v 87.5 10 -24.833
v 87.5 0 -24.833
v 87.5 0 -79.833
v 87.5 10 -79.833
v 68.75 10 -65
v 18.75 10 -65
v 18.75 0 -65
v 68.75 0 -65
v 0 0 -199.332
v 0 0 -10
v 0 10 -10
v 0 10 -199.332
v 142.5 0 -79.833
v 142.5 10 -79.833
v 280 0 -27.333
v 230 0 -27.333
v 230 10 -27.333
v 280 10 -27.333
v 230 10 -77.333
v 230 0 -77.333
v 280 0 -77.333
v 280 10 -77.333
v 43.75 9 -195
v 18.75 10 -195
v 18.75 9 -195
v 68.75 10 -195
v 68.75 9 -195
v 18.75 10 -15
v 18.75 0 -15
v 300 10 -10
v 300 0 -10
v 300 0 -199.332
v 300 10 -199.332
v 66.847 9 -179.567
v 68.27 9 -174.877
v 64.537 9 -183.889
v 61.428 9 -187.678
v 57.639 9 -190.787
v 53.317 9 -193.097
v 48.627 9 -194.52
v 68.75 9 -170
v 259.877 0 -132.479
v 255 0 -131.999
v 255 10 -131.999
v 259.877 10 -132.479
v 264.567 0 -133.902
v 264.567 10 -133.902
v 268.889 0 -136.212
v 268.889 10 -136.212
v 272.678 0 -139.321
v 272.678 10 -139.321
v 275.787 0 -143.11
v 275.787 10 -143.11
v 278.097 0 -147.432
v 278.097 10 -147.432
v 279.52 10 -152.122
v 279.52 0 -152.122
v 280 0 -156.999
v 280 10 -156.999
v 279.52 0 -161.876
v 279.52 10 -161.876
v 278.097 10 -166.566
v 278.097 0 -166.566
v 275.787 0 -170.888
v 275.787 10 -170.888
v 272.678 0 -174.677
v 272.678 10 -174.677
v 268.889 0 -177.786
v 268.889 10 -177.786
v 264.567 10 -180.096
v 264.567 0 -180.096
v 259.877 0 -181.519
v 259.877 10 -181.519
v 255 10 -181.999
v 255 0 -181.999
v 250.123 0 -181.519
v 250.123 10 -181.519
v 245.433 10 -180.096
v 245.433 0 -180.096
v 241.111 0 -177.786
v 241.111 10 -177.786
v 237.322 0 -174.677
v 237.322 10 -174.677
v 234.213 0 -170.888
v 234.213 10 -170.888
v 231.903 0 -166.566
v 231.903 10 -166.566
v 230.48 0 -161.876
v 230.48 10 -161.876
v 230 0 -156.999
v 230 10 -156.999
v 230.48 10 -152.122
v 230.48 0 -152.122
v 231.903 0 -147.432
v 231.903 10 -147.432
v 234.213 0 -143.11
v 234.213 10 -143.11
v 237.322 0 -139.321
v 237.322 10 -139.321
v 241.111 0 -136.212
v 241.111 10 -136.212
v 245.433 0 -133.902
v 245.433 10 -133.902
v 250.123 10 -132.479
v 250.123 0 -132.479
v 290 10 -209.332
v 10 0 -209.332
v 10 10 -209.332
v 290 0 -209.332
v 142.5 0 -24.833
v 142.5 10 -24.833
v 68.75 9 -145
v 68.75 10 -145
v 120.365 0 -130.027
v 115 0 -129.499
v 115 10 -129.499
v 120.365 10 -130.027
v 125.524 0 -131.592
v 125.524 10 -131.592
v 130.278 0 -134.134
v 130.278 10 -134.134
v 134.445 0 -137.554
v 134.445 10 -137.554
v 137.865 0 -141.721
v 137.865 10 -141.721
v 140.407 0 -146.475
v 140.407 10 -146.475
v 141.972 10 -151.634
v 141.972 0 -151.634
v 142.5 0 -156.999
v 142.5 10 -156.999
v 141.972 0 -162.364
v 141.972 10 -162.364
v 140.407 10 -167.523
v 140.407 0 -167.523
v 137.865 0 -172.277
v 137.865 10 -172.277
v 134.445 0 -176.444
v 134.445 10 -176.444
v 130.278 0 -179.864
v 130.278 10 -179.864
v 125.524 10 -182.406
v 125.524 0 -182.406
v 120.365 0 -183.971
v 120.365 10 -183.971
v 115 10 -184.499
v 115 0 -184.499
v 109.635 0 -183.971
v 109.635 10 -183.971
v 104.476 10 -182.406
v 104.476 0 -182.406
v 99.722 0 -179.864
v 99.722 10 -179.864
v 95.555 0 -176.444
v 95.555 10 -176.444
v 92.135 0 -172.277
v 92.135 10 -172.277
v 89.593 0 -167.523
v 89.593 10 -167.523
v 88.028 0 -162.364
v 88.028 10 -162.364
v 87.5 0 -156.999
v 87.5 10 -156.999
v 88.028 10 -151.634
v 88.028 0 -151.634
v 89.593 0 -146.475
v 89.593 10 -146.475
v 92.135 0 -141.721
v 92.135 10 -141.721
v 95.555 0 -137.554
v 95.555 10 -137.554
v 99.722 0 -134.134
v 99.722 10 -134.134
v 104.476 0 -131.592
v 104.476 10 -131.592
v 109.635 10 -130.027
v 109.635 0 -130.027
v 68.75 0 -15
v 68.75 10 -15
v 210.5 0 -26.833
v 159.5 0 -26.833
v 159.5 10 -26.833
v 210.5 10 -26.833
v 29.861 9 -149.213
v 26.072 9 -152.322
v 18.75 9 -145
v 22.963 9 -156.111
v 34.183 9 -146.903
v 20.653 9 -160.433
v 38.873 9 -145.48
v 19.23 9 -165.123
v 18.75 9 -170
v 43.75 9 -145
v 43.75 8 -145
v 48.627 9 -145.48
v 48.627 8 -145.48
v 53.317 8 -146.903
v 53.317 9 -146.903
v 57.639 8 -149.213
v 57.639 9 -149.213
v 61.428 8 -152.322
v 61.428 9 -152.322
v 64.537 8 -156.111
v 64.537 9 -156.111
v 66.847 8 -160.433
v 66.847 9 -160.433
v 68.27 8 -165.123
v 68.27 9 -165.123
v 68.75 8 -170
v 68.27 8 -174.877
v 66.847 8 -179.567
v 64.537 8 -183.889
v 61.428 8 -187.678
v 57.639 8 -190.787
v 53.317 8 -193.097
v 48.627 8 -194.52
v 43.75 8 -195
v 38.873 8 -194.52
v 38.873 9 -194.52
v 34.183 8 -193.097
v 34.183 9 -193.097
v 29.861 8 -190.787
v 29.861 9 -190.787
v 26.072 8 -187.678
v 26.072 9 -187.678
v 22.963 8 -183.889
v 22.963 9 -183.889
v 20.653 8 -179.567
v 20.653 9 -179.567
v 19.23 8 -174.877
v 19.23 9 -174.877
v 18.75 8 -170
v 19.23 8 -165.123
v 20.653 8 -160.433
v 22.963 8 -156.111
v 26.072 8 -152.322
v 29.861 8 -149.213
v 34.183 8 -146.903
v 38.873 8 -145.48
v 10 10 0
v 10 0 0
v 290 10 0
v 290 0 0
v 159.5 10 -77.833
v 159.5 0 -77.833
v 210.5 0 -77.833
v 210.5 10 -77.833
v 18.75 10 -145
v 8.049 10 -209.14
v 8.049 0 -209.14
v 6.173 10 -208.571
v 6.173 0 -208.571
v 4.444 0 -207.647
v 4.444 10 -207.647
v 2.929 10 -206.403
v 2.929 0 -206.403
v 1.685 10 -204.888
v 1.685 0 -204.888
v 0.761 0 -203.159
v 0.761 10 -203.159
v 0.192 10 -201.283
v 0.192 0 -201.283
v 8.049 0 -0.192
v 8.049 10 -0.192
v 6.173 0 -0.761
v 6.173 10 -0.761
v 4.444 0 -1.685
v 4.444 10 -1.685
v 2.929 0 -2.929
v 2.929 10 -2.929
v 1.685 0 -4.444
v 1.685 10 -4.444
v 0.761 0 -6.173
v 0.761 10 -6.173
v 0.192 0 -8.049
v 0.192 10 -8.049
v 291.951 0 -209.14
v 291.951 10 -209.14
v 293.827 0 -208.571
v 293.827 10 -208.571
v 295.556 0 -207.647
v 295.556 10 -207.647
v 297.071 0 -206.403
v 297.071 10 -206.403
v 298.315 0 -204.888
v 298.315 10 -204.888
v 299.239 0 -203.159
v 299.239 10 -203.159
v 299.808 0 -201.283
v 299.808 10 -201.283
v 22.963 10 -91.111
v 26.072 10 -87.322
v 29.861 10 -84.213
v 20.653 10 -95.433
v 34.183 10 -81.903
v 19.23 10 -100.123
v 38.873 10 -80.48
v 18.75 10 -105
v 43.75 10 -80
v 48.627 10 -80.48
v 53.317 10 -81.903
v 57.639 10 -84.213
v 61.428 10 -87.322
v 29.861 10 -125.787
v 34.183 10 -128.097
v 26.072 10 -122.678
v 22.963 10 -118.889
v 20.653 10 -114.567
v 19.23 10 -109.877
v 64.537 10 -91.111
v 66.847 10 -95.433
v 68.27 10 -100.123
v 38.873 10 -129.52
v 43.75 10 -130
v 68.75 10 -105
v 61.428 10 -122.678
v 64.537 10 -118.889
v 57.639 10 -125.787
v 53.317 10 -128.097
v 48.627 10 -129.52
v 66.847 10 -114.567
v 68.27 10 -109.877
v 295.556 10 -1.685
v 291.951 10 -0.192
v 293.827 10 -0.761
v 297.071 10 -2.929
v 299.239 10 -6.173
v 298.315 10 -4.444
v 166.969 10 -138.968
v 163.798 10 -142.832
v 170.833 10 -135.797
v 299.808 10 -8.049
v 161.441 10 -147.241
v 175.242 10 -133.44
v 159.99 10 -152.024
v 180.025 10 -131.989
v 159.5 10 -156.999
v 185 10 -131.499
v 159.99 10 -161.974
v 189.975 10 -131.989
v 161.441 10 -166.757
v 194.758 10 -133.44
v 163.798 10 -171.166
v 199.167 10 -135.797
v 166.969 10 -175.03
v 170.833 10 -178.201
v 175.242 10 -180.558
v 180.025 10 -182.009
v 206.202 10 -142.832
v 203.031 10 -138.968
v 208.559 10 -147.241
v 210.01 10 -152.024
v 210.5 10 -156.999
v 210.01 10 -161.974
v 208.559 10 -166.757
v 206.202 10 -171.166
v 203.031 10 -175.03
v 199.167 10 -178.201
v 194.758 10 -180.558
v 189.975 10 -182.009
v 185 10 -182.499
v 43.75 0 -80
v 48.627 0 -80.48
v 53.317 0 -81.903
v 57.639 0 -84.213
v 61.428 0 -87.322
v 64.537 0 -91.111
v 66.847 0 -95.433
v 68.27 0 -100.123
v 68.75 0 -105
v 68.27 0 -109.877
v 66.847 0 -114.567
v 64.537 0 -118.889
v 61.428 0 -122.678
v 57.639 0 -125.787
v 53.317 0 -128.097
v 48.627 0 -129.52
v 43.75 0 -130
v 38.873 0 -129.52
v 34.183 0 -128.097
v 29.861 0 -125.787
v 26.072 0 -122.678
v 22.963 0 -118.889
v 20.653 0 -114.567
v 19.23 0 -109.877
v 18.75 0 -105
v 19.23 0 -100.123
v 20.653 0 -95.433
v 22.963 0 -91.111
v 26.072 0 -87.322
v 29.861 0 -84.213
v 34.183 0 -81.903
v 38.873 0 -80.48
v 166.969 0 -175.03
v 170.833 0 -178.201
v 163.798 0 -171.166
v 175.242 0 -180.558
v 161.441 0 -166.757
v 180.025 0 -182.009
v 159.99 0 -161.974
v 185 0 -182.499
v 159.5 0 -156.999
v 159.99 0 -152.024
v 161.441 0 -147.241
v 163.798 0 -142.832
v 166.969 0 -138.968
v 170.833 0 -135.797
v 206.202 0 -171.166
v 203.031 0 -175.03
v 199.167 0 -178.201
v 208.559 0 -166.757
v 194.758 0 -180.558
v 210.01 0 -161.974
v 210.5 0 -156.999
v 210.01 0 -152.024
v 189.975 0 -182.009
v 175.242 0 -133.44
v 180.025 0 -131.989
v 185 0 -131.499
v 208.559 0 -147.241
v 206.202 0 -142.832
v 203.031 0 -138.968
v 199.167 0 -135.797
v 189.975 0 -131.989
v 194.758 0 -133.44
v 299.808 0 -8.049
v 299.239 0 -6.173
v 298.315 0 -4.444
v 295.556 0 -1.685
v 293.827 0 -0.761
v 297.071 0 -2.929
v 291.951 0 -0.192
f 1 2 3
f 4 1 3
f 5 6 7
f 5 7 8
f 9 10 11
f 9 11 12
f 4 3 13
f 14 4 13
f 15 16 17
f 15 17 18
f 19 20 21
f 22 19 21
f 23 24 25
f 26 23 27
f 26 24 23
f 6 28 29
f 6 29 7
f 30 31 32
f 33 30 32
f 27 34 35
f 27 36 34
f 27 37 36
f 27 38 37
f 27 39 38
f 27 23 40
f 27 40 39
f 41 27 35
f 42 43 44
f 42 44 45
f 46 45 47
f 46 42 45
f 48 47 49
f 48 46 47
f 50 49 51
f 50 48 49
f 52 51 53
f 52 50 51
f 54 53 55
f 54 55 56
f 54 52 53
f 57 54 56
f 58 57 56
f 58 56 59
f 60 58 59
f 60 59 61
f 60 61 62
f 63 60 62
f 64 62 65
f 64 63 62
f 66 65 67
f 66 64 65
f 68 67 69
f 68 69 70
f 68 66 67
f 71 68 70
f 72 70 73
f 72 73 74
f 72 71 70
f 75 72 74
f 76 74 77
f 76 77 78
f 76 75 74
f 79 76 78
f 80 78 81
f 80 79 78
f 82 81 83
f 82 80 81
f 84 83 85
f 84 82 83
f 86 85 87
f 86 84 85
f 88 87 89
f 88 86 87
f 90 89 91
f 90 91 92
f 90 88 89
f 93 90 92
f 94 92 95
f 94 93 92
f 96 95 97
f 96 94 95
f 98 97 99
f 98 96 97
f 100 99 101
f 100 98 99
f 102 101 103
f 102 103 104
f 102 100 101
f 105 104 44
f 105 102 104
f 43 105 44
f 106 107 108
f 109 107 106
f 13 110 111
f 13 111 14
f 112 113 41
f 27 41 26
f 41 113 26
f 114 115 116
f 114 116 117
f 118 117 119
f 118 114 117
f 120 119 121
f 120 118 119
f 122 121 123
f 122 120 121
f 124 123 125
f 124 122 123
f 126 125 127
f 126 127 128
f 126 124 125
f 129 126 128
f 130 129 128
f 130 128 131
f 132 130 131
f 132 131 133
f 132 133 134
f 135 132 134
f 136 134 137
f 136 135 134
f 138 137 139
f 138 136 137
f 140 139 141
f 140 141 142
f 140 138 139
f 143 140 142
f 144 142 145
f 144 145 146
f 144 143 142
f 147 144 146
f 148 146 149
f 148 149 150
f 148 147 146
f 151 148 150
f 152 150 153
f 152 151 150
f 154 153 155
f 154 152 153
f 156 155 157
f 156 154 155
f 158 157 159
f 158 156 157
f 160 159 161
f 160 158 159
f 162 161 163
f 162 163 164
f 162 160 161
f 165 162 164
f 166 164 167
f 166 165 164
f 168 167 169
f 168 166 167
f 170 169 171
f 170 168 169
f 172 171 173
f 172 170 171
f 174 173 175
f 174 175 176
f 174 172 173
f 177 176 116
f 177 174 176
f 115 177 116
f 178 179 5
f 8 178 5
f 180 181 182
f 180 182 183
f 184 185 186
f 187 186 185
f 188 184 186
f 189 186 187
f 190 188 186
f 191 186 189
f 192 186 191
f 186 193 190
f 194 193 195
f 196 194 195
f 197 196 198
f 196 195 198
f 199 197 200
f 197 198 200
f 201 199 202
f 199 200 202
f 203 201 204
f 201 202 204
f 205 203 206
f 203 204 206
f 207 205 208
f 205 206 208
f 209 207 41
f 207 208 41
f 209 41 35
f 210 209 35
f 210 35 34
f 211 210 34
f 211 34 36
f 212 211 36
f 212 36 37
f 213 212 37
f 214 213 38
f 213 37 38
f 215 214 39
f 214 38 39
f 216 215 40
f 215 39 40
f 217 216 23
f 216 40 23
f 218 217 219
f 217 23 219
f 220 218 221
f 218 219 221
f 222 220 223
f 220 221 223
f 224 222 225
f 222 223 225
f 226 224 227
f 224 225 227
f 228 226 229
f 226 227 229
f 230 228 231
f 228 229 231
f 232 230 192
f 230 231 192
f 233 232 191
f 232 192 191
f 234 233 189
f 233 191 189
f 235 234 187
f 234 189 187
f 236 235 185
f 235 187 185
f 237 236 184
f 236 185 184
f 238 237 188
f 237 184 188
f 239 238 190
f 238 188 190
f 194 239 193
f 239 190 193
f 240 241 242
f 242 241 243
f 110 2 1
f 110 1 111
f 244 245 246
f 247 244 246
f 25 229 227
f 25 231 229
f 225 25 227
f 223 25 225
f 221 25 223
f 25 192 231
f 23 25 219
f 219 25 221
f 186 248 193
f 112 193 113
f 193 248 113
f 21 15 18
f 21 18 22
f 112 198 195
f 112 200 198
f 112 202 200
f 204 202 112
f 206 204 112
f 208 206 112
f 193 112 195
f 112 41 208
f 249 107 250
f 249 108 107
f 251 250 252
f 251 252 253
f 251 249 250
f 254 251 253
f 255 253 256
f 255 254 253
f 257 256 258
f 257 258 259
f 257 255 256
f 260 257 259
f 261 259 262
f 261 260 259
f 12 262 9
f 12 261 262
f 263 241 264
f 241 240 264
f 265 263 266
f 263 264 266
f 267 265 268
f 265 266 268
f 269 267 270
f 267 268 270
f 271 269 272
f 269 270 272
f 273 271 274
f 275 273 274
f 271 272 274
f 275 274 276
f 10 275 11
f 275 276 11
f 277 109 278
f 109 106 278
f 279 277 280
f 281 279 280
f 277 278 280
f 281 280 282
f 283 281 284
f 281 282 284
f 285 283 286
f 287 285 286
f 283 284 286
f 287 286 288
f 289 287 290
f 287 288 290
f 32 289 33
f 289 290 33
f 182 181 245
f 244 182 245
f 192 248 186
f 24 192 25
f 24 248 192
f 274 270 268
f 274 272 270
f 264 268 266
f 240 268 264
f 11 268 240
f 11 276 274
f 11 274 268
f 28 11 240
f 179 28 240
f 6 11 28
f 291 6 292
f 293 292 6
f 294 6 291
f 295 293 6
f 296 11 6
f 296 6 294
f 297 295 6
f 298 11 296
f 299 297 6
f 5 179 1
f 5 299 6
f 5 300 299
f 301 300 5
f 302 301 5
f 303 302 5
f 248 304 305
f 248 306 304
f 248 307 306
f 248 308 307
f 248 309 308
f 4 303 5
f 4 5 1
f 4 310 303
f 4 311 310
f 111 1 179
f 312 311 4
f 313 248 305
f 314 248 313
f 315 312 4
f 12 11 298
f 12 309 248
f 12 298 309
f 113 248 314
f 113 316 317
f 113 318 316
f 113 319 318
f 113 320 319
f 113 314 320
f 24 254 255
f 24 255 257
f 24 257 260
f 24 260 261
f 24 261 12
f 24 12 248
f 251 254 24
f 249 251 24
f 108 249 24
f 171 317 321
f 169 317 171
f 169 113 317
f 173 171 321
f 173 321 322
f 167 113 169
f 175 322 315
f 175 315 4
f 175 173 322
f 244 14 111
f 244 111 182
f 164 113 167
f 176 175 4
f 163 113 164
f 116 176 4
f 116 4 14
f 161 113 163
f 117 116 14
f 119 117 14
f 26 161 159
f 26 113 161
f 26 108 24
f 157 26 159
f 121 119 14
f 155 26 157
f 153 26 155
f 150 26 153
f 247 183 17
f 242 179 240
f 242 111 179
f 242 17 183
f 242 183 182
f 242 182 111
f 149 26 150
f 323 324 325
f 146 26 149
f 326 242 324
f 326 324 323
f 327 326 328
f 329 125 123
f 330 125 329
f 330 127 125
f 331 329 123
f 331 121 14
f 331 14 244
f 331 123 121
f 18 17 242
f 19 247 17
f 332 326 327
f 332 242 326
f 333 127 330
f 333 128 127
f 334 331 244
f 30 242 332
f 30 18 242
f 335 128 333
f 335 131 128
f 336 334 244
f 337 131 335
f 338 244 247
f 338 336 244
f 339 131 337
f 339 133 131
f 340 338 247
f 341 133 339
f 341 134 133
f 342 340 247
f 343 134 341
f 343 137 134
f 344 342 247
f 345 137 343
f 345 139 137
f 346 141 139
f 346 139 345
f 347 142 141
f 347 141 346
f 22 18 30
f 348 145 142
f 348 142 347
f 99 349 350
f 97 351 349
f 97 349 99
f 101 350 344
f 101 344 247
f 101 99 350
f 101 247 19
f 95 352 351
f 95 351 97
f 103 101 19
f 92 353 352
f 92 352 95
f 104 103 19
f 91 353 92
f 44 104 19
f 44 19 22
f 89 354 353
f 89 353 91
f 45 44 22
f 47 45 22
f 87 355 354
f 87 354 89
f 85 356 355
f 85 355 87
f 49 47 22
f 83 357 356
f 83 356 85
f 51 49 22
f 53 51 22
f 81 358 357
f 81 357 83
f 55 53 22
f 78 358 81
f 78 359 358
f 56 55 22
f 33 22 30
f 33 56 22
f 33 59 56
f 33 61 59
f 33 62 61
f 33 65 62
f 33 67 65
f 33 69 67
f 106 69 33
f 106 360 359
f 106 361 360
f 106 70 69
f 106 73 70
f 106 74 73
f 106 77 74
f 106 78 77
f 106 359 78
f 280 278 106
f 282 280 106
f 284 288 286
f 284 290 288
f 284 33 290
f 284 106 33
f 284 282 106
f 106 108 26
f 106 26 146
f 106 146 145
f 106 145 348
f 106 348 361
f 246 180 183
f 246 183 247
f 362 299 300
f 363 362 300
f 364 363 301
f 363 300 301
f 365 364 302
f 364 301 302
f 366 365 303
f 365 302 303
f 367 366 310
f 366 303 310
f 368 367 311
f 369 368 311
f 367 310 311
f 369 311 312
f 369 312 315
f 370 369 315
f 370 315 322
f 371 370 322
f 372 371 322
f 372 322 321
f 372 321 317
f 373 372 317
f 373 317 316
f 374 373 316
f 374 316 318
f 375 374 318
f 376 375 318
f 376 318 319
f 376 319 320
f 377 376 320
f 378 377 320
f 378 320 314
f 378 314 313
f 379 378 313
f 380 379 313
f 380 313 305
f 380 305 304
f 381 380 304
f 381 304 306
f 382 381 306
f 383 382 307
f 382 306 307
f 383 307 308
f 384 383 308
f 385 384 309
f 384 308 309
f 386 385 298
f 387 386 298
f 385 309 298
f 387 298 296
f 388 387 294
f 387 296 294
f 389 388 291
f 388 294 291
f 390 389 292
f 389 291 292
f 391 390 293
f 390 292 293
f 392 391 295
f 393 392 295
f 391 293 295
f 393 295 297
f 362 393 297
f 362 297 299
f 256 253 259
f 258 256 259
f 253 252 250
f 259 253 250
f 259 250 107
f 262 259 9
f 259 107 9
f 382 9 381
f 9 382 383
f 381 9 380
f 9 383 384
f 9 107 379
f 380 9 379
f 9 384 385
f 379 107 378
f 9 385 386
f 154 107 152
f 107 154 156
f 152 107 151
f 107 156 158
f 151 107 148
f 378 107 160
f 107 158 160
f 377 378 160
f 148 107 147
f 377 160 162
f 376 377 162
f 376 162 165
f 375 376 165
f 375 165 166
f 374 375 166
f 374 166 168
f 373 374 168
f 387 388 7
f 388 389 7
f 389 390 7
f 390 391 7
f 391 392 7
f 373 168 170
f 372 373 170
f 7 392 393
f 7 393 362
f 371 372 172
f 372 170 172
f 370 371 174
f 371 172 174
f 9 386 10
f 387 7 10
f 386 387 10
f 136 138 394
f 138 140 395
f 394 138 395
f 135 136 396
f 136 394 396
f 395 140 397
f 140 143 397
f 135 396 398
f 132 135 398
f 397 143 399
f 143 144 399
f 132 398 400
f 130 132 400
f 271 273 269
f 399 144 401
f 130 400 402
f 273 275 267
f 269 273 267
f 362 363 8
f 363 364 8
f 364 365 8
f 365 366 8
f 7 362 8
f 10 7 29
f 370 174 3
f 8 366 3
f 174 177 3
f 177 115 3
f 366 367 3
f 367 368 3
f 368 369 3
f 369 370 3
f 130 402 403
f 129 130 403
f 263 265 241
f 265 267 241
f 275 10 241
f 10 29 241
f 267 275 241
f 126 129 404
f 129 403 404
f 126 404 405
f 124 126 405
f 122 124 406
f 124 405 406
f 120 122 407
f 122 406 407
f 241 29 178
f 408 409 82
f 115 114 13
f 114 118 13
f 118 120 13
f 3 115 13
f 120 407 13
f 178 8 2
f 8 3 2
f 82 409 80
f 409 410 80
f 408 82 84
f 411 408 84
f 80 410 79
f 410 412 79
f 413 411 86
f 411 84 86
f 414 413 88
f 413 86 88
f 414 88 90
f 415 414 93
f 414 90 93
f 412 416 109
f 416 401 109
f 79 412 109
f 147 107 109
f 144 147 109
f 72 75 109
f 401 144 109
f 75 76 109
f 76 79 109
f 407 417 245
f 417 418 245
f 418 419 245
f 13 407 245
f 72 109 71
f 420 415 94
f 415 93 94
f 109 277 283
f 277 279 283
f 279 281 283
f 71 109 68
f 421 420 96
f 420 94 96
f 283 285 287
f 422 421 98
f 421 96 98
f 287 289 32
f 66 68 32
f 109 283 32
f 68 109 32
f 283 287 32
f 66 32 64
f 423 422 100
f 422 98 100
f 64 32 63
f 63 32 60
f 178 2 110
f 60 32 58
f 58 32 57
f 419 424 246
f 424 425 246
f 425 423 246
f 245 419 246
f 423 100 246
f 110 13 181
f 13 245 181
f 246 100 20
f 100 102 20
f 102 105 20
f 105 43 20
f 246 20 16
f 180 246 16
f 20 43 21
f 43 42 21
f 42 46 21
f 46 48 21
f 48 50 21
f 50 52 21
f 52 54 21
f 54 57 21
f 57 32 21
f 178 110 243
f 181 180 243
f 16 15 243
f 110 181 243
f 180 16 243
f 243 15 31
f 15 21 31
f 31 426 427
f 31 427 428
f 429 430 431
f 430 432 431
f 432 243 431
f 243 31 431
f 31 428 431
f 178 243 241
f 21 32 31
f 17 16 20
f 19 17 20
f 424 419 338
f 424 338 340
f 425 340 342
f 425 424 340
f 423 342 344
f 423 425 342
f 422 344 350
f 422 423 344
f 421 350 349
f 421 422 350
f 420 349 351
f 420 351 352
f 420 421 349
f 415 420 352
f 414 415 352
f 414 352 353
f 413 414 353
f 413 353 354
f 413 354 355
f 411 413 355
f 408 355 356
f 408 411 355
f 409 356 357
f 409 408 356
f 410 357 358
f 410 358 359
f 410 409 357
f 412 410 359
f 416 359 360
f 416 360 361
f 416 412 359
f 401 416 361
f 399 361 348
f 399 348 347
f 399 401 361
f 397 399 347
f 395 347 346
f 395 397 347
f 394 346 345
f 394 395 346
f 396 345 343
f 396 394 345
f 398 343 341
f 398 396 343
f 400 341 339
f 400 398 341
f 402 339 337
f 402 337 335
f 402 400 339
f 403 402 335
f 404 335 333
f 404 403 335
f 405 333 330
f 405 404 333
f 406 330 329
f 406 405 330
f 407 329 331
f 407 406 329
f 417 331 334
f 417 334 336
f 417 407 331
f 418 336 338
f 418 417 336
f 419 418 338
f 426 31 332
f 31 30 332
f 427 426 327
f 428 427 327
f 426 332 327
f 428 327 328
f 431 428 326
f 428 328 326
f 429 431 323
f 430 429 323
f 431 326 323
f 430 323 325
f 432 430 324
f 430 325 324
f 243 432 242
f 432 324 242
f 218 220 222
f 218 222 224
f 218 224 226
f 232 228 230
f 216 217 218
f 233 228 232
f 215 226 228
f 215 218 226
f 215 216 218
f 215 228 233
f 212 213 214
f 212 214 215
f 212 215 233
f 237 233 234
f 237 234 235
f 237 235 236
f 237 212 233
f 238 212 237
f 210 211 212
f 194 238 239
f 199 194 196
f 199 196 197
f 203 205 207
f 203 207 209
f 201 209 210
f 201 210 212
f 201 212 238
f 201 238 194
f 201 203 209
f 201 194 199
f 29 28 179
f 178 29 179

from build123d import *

# Parameters (mm, degrees)
SKETCH1_W           = 300
SKETCH1_H           = 209.332
SKETCH1_R           = 25
SKETCH1_R_2         = 27.5
SKETCH1_R_3         = 25.5
SKETCH1_W_2         = 55
SKETCH1_H_2         = 55
SKETCH1_W_3         = 51
SKETCH1_H_3         = 51
SKETCH1_W_4         = 50
SKETCH1_H_4         = 50
BOSS_EXTRUDE1_DEPTH = 10
SKETCH2_W           = 50
SKETCH2_H           = 50
CUT_EXTRUDE1_DEPTH  = 1
BOSS_EXTRUDE2_START = -9
SKETCH3_R           = 25
BOSS_EXTRUDE2_DEPTH = 8
SKETCH4_W           = 50
SKETCH4_H           = 50
CUT_EXTRUDE2_DEPTH  = 366.950660915
FILLET1_R           = 10
SKETCH5_W           = 50
SKETCH5_H           = 50
BOSS_EXTRUDE3_DEPTH = 10
SKETCH6_R           = 25
SKETCH6_W           = 50
SKETCH6_H           = 50
CUT_EXTRUDE3_DEPTH  = 366.950660915
BOSS_EXTRUDE4_START = -1
SKETCH7_W           = 50
SKETCH7_H           = 50
BOSS_EXTRUDE4_DEPTH = 9
SKETCH8_R           = 25
CUT_EXTRUDE4_DEPTH  = 1


with BuildPart() as part:
    # Sketch1 → Boss-Extrude1 (new body)
    with BuildSketch(Plane(origin=(0, 0, 0), x_dir=(1, 0, 0), z_dir=(0, 1, 0))):
        with Locations((150, 104.666)):
            Rectangle(SKETCH1_W, SKETCH1_H)
        with Locations(Location((45, 156.999, 0), (0, 0, 270))):
            Circle(SKETCH1_R, mode=Mode.SUBTRACT)
        with Locations(Location((45, 52.333, 0), (0, 0, 270))):
            Circle(SKETCH1_R, mode=Mode.SUBTRACT)
        with Locations(Location((115, 156.999, 0), (0, 0, 270))):
            Circle(SKETCH1_R_2, mode=Mode.SUBTRACT)
        with Locations(Location((185, 156.999, 0), (0, 0, 270))):
            Circle(SKETCH1_R_3, mode=Mode.SUBTRACT)
        with Locations(Location((255, 156.999, 0), (0, 0, 270))):
            Circle(SKETCH1_R, mode=Mode.SUBTRACT)
        with Locations((115, 52.333)):
            Rectangle(SKETCH1_W_2, SKETCH1_H_2, mode=Mode.SUBTRACT)
        with Locations((185, 52.333)):
            Rectangle(SKETCH1_W_3, SKETCH1_H_3, mode=Mode.SUBTRACT)
        with Locations((255, 52.333)):
            Rectangle(SKETCH1_W_4, SKETCH1_H_4, mode=Mode.SUBTRACT)
    extrude(amount=BOSS_EXTRUDE1_DEPTH)

    # Sketch2 → Cut-Extrude1 (cut)
    with BuildSketch(Plane(origin=(0, 10, 0), x_dir=(1, 0, 0), z_dir=(0, 1, 0))):
        with Locations((45, 156.999)):
            Rectangle(SKETCH2_W, SKETCH2_H)
    extrude(amount=-CUT_EXTRUDE1_DEPTH, mode=Mode.SUBTRACT)

    # Sketch3 → Boss-Extrude2 (add)
    with BuildSketch(Plane(origin=(0, 9, 0), x_dir=(1, 0, 0), z_dir=(0, 1, 0)).offset(BOSS_EXTRUDE2_START)):
        with Locations(Location((45, 156.999, 0), (0, 0, 270))):
            Circle(SKETCH3_R)
    extrude(amount=BOSS_EXTRUDE2_DEPTH)

    # Sketch4 → Cut-Extrude2 (cut, through all)
    with BuildSketch(Plane(origin=(0, 10, 0), x_dir=(1, 0, 0), z_dir=(0, 1, 0))):
        with Locations((45, 52.333)):
            Rectangle(SKETCH4_W, SKETCH4_H)
    extrude(amount=-CUT_EXTRUDE2_DEPTH, mode=Mode.SUBTRACT)

    # Fillet1
    fillet1_edges = [part.edges().sort_by_distance(p)[0] for p in [
        (0, 5, -209.332),
        (300, 5, -209.332),
        (300, 5, 0),
        (0, 5, 0),
    ]]
    fillet(fillet1_edges, radius=FILLET1_R)

    # Sketch5 → Boss-Extrude3 (add)
    with BuildSketch(Plane(origin=(0, 10, 0), x_dir=(1, 0, 0), z_dir=(0, 1, 0))):
        with Locations((45, 156.999)):
            Rectangle(SKETCH5_W, SKETCH5_H)
        with Locations((45, 52.333)):
            Rectangle(SKETCH5_W, SKETCH5_H)
    extrude(amount=-BOSS_EXTRUDE3_DEPTH)

    # Sketch6 → Cut-Extrude3 (cut, through all)
    with BuildSketch(Plane(origin=(0, 10, 0), x_dir=(1, 0, 0), z_dir=(0, 1, 0))):
        with Locations(Location((43.75, 105, 0), (0, 0, 270))):
            Circle(SKETCH6_R)
        with Locations((43.75, 40)):
            Rectangle(SKETCH6_W, SKETCH6_H)
        with Locations((43.75, 170)):
            Rectangle(SKETCH6_W, SKETCH6_H)
    extrude(amount=-CUT_EXTRUDE3_DEPTH, mode=Mode.SUBTRACT)

    # Sketch7 → Boss-Extrude4 (add)
    with BuildSketch(Plane(origin=(0, 10, 0), x_dir=(1, 0, 0), z_dir=(0, 1, 0)).offset(BOSS_EXTRUDE4_START)):
        with Locations((43.75, 170)):
            Rectangle(SKETCH7_W, SKETCH7_H)
    extrude(amount=-BOSS_EXTRUDE4_DEPTH)

    # Sketch8 → Cut-Extrude4 (cut)
    with BuildSketch(Plane(origin=(0, 9, 0), x_dir=(1, 0, 0), z_dir=(0, 1, 0))):
        with Locations(Location((43.75, 170, 0), (0, 0, 270))):
            Circle(SKETCH8_R)
    extrude(amount=-CUT_EXTRUDE4_DEPTH, mode=Mode.SUBTRACT)


solid = part.part
